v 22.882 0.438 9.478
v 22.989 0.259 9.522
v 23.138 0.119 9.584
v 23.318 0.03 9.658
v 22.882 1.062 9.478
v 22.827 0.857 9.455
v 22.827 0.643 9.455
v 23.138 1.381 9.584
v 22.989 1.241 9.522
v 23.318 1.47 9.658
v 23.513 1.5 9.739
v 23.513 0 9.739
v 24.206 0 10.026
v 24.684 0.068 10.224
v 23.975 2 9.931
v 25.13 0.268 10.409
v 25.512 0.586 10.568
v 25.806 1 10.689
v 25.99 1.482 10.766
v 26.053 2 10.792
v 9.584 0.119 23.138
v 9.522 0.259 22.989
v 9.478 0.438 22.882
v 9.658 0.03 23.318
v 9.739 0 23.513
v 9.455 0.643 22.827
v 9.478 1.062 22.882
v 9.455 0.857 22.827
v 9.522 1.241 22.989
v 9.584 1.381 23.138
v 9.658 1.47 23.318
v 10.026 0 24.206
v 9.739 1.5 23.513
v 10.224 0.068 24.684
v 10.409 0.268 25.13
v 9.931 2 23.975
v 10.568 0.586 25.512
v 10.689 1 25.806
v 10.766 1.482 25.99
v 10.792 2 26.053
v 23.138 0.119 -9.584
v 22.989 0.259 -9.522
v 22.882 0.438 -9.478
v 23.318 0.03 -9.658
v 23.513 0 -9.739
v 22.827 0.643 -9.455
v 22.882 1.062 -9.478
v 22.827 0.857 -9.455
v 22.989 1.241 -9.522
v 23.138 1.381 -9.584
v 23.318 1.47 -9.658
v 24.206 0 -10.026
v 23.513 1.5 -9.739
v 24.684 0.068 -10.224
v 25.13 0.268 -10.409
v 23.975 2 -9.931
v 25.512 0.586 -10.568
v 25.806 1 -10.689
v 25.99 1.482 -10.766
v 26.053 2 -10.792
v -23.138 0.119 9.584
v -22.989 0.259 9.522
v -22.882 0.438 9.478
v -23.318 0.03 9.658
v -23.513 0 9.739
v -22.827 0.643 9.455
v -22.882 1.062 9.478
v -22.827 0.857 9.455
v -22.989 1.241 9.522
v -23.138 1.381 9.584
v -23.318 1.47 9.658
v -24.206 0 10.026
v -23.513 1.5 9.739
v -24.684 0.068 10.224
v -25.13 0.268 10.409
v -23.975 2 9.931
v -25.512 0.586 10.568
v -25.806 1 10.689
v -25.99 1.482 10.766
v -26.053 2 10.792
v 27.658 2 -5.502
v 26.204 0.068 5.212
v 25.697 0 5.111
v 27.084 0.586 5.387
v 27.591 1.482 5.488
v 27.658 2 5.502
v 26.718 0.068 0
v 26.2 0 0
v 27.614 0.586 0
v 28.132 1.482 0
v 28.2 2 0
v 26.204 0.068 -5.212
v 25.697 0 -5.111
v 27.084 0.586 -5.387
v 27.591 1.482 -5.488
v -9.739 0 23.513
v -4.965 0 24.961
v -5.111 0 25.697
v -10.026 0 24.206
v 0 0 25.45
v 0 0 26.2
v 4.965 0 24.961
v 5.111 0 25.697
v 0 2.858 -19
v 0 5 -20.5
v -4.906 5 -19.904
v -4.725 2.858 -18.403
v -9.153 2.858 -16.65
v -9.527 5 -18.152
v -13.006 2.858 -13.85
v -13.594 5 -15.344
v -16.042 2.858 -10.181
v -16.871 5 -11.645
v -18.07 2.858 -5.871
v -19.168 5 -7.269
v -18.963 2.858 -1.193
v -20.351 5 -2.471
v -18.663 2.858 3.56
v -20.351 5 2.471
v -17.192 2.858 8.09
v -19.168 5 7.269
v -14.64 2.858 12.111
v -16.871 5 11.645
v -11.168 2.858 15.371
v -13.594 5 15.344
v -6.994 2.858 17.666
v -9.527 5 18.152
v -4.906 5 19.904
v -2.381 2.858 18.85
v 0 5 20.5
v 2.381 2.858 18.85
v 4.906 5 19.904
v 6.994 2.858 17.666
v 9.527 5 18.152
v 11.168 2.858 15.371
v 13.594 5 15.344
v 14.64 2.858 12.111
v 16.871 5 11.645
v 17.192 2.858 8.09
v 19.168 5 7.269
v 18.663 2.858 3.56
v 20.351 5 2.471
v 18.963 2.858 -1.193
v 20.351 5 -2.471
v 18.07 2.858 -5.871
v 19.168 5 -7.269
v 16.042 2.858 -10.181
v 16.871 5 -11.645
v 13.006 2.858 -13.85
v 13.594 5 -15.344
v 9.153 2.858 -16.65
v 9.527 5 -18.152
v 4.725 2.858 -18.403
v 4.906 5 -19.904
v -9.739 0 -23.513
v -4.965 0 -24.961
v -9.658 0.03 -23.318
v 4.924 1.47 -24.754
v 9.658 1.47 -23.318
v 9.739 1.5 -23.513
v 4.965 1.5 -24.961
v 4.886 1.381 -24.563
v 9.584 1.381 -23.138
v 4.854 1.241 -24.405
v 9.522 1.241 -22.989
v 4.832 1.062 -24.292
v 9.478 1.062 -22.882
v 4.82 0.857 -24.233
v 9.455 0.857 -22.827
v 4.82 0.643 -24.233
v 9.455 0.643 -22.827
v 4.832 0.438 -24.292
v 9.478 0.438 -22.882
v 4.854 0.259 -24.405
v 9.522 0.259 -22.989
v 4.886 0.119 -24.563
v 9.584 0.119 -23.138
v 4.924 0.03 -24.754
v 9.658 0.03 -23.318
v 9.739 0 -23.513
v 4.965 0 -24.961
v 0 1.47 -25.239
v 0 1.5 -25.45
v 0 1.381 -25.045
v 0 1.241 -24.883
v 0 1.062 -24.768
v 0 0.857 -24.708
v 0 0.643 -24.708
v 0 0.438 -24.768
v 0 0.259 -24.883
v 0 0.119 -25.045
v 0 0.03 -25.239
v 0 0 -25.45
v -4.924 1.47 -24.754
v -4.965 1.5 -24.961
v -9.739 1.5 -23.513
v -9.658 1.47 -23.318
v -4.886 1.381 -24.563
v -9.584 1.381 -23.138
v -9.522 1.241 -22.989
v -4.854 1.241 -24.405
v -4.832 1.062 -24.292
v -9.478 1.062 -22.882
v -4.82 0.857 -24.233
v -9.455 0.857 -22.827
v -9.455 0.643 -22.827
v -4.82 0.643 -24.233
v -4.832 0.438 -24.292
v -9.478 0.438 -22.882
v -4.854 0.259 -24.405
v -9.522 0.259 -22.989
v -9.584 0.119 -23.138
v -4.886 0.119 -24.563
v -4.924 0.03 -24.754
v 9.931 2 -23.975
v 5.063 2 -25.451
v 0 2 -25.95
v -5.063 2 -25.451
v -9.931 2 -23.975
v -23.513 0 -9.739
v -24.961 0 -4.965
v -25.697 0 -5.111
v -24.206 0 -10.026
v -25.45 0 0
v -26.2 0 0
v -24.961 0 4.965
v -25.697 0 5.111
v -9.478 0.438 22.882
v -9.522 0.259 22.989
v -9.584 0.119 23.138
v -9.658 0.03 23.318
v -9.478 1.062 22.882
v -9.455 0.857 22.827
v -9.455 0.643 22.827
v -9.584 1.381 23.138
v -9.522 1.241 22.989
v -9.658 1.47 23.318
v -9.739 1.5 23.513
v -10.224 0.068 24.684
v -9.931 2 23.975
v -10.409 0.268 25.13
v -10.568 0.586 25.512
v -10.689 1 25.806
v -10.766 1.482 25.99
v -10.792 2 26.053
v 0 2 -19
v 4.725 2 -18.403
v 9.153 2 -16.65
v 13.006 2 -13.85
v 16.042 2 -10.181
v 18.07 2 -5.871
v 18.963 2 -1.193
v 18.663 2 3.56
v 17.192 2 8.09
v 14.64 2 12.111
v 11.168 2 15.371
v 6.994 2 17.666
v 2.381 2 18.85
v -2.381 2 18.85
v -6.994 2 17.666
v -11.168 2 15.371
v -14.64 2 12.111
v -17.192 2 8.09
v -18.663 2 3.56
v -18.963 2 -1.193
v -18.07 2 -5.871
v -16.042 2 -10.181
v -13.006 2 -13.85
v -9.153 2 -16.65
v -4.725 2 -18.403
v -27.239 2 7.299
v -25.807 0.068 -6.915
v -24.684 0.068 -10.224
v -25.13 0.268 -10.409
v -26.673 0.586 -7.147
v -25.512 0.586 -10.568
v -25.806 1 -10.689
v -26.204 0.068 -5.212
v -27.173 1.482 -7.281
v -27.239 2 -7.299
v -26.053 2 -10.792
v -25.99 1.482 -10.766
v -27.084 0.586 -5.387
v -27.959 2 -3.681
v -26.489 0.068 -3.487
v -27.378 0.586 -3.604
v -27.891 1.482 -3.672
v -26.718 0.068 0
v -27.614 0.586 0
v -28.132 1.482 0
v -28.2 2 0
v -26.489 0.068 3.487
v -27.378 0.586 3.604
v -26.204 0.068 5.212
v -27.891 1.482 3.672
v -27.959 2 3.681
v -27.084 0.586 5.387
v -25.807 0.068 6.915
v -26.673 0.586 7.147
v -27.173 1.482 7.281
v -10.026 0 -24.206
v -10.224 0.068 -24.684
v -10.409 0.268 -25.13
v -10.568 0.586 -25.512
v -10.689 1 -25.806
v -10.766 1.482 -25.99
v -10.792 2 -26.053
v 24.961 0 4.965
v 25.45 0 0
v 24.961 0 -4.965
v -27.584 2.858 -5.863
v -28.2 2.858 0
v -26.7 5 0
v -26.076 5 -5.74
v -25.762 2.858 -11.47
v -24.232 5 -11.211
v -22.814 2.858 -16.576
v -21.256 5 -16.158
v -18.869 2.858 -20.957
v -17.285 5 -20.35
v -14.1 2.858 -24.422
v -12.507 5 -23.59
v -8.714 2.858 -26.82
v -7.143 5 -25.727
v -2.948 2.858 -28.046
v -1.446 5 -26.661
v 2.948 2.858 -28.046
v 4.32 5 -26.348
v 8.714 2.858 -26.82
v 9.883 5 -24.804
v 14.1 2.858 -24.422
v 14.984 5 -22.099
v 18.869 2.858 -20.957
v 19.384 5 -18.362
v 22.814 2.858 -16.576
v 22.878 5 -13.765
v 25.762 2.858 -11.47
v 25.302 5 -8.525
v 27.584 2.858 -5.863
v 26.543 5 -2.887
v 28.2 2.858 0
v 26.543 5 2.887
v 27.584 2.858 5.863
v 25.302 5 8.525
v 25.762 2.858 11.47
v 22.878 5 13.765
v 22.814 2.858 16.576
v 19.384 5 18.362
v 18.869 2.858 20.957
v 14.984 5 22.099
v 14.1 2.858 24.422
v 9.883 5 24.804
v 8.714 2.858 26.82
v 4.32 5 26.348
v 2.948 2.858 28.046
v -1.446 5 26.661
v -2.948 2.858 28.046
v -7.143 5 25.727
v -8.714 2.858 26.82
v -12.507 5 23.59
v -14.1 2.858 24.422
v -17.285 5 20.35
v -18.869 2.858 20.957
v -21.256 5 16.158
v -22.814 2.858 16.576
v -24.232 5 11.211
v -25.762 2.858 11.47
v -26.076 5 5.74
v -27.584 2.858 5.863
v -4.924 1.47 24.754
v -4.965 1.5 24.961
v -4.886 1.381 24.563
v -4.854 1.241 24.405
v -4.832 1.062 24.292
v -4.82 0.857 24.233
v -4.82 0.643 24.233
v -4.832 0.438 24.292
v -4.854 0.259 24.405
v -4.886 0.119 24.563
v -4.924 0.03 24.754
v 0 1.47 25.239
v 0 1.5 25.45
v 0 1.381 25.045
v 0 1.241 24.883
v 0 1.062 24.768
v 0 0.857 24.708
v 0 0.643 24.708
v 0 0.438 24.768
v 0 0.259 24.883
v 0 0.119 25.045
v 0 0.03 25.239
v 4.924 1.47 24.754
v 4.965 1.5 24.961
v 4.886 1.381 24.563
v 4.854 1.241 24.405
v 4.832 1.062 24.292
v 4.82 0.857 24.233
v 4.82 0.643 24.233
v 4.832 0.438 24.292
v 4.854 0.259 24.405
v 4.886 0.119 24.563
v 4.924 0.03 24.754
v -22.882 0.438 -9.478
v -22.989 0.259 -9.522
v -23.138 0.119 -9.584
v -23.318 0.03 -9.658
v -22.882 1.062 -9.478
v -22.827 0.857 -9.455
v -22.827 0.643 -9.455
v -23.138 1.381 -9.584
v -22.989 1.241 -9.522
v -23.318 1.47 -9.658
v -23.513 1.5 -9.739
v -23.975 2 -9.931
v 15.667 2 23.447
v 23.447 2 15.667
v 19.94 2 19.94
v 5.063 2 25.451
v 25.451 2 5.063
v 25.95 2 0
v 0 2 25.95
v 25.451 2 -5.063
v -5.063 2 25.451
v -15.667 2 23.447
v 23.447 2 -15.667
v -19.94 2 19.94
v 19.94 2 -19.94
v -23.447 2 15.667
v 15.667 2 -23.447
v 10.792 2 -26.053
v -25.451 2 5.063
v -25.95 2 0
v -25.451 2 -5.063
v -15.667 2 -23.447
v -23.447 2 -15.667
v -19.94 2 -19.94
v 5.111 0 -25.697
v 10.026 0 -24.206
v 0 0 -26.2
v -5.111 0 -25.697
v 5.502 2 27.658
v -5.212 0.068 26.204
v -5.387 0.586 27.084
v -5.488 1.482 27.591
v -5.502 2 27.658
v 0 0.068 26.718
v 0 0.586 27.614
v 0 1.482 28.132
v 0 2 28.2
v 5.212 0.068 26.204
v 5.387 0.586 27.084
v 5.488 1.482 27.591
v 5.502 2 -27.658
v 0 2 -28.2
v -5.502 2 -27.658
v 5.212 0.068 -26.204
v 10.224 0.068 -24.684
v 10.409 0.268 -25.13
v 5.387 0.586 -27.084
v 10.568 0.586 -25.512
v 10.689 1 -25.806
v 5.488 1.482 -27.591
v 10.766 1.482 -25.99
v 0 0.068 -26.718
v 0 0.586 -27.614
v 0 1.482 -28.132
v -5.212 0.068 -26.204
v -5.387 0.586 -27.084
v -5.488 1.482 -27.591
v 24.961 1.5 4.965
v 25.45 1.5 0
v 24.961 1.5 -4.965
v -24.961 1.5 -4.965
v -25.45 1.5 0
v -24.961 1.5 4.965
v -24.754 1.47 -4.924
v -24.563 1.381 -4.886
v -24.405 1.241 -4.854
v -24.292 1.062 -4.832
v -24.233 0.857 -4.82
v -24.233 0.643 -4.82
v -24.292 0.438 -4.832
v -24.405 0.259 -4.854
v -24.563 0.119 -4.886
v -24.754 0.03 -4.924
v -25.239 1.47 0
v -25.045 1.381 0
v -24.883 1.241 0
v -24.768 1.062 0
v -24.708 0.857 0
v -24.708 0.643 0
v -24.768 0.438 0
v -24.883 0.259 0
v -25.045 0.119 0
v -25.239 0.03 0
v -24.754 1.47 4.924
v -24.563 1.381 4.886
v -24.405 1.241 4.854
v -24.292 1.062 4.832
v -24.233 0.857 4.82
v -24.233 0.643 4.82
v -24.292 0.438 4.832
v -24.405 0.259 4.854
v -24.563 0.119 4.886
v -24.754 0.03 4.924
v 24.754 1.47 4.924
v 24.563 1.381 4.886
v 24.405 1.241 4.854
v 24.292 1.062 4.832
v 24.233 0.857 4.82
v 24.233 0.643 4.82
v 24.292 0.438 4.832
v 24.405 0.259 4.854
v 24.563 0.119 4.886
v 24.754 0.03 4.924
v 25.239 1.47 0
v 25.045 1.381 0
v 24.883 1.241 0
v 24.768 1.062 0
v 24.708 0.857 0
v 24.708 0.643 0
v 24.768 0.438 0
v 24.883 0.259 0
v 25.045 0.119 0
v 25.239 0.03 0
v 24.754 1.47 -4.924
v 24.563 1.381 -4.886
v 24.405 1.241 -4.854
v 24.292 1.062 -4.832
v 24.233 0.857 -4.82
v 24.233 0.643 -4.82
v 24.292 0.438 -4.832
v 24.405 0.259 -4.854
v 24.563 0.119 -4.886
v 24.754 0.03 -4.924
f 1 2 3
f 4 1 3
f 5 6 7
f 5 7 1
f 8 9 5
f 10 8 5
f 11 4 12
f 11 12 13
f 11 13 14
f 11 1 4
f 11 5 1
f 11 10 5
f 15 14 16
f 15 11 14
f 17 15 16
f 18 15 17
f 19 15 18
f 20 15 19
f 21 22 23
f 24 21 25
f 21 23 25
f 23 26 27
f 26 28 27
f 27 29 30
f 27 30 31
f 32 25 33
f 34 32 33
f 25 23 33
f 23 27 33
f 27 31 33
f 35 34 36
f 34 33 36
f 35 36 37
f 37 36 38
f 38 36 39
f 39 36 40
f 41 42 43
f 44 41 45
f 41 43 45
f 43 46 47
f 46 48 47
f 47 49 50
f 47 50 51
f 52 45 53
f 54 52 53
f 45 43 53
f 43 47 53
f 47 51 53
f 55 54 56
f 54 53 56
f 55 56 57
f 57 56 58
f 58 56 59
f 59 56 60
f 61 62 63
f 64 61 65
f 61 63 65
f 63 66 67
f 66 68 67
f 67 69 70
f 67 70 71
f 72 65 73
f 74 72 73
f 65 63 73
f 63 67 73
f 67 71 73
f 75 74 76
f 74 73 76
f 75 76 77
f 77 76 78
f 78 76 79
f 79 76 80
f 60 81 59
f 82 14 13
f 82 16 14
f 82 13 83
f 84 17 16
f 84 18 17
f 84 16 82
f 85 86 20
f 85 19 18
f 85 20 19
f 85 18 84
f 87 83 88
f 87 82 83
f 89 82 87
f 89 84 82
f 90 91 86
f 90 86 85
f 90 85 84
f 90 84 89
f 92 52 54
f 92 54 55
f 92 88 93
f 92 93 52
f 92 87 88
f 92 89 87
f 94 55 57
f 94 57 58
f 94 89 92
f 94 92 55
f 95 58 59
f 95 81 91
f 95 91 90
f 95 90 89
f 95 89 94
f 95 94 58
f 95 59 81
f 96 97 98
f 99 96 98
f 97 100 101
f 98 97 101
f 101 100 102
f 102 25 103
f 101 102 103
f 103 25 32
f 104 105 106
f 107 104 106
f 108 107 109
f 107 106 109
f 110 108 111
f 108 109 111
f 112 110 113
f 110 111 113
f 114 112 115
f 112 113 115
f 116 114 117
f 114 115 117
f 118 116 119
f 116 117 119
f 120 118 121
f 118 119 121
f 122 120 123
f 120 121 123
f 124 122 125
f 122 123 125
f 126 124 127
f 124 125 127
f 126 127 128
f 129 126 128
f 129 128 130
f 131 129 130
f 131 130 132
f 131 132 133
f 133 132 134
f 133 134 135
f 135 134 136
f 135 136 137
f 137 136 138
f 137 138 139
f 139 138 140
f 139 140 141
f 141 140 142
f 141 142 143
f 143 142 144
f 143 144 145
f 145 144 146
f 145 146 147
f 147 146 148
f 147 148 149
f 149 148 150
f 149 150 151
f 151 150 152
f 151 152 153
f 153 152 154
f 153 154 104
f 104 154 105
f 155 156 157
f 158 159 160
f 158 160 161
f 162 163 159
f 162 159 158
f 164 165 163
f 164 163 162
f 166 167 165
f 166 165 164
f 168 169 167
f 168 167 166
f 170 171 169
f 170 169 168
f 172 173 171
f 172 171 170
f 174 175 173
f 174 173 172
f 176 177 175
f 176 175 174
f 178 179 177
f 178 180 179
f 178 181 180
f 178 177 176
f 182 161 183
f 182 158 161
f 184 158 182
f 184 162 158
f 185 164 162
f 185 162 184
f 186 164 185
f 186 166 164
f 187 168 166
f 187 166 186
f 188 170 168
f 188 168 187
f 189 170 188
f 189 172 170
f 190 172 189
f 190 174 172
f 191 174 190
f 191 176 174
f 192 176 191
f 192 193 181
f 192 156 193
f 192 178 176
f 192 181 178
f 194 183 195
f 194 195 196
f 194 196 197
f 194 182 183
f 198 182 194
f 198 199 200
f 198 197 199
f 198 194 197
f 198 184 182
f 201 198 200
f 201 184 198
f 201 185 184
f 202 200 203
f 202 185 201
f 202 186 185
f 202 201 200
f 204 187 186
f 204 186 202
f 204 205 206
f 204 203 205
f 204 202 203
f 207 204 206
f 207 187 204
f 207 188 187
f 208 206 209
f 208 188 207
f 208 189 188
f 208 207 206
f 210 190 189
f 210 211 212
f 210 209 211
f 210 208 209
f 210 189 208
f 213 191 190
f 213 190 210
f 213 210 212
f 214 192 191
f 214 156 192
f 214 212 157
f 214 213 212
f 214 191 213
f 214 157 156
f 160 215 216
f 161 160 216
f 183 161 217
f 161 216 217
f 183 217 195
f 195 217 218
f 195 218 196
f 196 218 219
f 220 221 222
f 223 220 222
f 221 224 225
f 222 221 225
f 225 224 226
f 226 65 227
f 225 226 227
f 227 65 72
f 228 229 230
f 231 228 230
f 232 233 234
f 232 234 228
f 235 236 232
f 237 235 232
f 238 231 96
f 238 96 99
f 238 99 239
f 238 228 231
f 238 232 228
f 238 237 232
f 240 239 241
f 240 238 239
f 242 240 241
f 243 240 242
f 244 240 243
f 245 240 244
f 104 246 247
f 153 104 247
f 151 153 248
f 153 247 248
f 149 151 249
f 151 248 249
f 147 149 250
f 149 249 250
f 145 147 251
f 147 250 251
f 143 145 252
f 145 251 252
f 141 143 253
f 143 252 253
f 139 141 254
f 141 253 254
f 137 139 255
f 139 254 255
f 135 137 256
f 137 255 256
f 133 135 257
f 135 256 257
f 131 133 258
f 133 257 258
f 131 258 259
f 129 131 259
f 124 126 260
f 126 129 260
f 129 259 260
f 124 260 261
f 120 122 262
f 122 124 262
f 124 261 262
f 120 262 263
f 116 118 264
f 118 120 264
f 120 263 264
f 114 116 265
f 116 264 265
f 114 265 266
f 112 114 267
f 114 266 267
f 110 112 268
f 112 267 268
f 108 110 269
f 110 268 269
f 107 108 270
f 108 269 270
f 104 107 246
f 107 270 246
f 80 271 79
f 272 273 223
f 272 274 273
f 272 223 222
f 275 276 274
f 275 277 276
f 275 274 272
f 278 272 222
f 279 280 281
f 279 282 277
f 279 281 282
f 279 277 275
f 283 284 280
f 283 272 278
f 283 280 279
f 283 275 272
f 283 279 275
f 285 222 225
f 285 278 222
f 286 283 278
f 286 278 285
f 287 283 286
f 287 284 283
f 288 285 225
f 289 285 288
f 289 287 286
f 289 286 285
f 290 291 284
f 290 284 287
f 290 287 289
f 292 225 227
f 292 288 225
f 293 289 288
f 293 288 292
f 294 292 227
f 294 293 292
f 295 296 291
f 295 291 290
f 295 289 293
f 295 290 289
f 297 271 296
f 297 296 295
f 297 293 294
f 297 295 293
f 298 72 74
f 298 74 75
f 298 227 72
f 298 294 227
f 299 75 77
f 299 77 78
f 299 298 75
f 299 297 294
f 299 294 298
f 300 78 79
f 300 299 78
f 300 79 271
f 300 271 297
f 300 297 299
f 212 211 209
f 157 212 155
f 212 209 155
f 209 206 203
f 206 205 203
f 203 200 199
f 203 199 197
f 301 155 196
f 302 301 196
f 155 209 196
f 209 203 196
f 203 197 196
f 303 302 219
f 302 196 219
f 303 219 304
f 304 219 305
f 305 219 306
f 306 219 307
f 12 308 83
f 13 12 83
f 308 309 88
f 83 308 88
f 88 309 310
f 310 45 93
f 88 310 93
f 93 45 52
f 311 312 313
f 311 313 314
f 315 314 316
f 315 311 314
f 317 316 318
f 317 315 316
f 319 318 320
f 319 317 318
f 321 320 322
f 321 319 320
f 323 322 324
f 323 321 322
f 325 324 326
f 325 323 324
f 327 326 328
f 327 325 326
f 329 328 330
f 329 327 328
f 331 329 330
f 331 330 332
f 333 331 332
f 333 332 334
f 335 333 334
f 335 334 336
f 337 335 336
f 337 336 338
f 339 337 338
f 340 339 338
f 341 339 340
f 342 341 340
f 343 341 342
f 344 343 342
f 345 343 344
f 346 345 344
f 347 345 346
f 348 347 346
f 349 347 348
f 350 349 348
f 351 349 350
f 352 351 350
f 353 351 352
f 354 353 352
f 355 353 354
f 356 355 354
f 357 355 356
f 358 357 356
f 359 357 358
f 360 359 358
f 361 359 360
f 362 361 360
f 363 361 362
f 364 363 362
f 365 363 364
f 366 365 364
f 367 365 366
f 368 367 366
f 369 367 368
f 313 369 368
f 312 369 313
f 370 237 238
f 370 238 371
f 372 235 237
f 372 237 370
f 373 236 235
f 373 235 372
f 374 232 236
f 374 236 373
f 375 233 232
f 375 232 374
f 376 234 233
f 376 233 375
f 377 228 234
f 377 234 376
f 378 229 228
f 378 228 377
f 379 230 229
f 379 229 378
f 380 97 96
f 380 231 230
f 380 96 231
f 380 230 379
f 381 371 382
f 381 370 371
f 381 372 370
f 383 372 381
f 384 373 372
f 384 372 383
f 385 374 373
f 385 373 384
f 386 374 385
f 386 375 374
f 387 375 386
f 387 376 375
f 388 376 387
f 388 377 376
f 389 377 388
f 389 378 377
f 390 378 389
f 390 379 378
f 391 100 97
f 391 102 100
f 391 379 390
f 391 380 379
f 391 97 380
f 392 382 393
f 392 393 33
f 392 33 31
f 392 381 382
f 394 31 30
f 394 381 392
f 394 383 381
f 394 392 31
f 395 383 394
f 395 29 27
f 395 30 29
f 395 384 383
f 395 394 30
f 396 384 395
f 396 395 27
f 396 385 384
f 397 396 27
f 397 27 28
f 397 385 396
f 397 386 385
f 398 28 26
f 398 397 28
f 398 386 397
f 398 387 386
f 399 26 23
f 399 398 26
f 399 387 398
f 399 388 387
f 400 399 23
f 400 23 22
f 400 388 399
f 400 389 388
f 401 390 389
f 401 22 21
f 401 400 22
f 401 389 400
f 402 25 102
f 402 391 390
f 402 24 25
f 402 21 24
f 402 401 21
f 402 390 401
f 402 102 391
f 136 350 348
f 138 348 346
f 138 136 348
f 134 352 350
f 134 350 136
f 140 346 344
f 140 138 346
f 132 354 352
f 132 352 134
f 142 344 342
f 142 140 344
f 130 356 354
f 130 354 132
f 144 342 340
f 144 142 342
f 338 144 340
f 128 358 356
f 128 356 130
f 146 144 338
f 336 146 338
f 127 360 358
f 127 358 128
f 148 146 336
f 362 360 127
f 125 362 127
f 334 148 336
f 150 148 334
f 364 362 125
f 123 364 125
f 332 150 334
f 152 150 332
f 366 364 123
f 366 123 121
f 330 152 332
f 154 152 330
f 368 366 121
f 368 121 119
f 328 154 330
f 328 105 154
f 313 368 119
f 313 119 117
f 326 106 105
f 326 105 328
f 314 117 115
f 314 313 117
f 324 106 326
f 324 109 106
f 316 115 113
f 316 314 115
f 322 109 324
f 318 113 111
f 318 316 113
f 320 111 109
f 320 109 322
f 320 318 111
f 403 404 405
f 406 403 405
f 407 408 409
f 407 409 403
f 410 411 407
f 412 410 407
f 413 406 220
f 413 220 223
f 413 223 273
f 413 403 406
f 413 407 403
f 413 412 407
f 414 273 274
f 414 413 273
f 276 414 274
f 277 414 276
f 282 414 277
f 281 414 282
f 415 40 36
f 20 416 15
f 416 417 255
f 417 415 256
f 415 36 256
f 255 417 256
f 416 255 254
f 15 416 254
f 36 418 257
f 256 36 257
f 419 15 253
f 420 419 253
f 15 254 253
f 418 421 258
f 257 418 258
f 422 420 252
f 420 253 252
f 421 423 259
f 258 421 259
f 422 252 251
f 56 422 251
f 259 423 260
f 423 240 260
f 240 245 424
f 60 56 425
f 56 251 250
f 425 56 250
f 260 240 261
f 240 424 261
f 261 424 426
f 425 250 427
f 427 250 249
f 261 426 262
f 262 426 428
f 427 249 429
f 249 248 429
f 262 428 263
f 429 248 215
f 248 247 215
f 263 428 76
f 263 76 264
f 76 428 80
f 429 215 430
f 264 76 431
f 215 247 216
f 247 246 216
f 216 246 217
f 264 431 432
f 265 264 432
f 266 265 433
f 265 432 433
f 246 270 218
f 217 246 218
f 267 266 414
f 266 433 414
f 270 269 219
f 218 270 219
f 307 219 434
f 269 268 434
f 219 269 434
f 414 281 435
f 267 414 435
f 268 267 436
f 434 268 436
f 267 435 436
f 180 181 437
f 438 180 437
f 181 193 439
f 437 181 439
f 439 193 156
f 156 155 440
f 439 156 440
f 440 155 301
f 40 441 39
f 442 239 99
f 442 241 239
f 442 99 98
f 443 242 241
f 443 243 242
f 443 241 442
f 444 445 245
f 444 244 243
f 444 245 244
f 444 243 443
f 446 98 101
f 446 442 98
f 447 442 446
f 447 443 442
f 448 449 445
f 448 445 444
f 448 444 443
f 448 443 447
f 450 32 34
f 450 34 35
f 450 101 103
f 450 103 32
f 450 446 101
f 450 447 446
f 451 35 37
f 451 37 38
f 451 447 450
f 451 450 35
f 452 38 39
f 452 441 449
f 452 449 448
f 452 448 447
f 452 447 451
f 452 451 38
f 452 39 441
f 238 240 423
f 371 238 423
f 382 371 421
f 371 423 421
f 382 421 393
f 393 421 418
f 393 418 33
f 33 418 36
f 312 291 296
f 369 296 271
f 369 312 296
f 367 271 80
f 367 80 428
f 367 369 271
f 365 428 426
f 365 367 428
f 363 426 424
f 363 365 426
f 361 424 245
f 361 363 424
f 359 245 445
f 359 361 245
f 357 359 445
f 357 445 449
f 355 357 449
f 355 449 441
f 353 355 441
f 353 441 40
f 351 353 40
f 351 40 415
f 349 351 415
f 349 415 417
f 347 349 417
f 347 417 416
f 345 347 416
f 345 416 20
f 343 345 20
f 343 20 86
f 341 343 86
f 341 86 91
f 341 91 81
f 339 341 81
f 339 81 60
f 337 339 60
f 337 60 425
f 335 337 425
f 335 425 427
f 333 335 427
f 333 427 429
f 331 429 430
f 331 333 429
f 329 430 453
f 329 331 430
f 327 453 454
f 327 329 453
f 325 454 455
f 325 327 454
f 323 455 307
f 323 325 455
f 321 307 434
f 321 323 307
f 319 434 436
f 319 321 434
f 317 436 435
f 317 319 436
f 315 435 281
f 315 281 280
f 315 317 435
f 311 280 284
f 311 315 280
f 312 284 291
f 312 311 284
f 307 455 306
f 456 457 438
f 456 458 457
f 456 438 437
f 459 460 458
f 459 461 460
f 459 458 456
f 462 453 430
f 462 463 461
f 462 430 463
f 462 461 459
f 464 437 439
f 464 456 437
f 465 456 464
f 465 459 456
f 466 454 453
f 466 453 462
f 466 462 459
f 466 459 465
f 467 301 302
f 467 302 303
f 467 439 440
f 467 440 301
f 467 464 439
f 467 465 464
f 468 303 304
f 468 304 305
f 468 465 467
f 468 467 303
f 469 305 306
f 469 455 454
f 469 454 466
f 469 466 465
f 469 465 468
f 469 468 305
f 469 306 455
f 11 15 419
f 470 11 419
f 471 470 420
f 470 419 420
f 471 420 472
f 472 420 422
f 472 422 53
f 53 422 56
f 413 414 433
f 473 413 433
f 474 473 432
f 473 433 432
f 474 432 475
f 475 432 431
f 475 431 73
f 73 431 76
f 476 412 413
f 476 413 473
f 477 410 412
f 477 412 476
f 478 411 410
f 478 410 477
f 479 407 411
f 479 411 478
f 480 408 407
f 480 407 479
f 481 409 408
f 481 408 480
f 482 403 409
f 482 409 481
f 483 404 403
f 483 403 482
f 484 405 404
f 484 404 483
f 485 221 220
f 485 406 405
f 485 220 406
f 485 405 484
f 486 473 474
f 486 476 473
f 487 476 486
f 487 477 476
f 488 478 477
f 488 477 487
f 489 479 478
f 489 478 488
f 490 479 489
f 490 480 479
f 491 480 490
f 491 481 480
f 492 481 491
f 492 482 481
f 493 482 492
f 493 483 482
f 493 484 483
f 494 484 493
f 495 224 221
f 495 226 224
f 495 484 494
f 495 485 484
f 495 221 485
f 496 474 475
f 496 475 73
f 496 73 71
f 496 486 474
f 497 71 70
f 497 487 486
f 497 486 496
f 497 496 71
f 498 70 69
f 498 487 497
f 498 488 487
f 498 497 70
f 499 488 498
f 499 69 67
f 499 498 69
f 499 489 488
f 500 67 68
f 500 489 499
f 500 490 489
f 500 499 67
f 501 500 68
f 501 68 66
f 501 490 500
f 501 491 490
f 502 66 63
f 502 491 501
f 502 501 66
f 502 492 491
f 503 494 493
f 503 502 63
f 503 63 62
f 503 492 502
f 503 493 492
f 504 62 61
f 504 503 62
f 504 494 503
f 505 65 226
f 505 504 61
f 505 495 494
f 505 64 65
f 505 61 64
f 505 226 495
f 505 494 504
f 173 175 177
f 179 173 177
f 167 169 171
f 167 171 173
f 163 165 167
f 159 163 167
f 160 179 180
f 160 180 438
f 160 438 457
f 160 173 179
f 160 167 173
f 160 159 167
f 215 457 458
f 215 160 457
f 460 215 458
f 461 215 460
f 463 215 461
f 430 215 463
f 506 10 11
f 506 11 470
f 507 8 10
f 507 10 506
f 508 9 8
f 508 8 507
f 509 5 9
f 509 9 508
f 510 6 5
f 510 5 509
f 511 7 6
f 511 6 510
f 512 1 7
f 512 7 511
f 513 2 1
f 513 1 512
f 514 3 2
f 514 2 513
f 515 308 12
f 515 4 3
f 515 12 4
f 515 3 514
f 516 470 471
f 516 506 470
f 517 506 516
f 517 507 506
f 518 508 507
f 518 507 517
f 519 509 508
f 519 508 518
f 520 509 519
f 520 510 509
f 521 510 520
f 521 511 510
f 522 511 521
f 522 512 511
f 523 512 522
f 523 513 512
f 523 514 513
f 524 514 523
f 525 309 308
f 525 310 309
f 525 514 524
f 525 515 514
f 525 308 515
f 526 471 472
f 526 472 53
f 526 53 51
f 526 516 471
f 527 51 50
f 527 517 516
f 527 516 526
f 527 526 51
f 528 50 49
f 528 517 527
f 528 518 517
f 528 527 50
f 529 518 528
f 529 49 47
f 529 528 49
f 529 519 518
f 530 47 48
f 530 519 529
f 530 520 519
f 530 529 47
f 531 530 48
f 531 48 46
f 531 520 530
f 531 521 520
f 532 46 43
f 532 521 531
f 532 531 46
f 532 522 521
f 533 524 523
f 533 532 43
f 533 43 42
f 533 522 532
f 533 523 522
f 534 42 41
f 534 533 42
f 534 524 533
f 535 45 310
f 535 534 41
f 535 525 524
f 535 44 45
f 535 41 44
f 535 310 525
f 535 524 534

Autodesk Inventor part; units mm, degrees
ref_plane "YZ Plane" through (0, 0, 0) normal (1, 0, 0) x (0, 1, 0)
ref_plane "XZ Plane" through (0, 0, 0) normal (0, 1, 0) x (-1, 0, 0)
ref_plane "XY Plane" through (0, 0, 0) normal (0, 0, 1) x (1, 0, 0)
sketch "Эскиз1" plane through (0, 0, 0) normal (1, 0, 0) x (0, 1, 0)
  line L0 (0, 0) -> (13.9611, 0) construction
  line L1 (0, 26.35) -> (-10, 26.35) construction
  line L2 (-10, 26.35) -> (-10, -26.35) construction
  line L3 (-10, -26.35) -> (0, -26.35) construction
  line L4 (0, -26.35) -> (0, 26.35) construction
  line L5 (0, 0) -> (0, -22.0675) construction
  line L6 (2, 25) -> (0, 25) construction
  line L7 (0, 25) -> (0, -25) construction
  line L8 (0, -25) -> (2, -25) construction
  line L9 (2, -25) -> (2, 25) construction
  line L10 (5, -19) -> (5, -30.35)
  line L11 (-2, -11.433) -> (-2, -38.2242) construction
  line L12 (5, -19) -> (2, -19)
  line L13 (5, -30.35) -> (2, -30.35)
  line L14 (2, -30.35) -> (2, -19)
  dimension "d0" = 10
  dimension "d1" = 52.7
  dimension "d2" = 2
  dimension "d3" = 50
  dimension "d4" = 3
  dimension "d6" = 2
  dimension "d7" = 6
  dimension "d8" = 3
  dimension "d10" = 4
revolve "Вращение1" add sketch "Эскиз1" angle 360 about axis through (0, 0, 0) along (0, 1, 0)
chamfer "Фаска1" distance 1.5 angle 55 1 edges at (0, 5, 19) measured on face at (2.4211, 5, -26.2727)
sketch "Эскиз2" plane through (0, 0, 0) normal (0, 0, 1) x (1, 0, 0)
  line L0 (-30.35, 5) -> (30.35, 5) construction
  line L1 (-30.35, 2) -> (30.35, 2) construction
  line L2 (-19, 2.8578) -> (19, 2.8578) construction
  line L3 (20.5, 5) -> (-20.5, 5) construction
  line L4 (-19, 2) -> (19, 2) construction
  line L5 (-19, 2.8578) -> (19, 2.8578) construction
  line L6 (0, 0) -> (25, 0) construction
  line L7 (25, 2) -> (25, -8.0068) construction
  line L8 (-30.35, 2) -> (30.35, 2) construction
  line L9 (25.2, 2) -> (25.2, -4.9803) construction
  line L10 (25.45, 1.5) -> (25.45, 1.5) construction
  line L11 (26.2, 1.5) -> (26.2, 0) construction
  line L12 (26.2, 0) -> (25.45, 0) construction
  line L13 (24.7, 0.75) -> (24.7, 0.75) construction
  line L14 (26.2, 0) -> (26.2, 0) construction
  line L15 (28.2, 2) -> (28.2, 2) construction
  line L16 (28.2, 2) -> (26.2, 2) construction
  line L17 (26.2, 2) -> (26.2, 2.25) construction
  arc A0 (25.45, 1.5) -> (24.7, 0.75) centre (25.45, 0.75) ccw
  arc A1 (24.7, 0.75) -> (25.45, 0) centre (25.45, 0.75) ccw
  arc A2 (26.2, 0) -> (28.2, 2) centre (26.2, 2) ccw
  line L18 (25.95, 2) -> (28.2, 2)
  line L19 (25.45, 0) -> (26.2, 0)
  line L20 (-19, 2) -> (19, 2) projected
  line L21 (0, 2) -> (0, 5)
  line L22 (-30.35, 5) -> (30.35, 5) projected
  line L23 (25.45, 1.5) -> (25.95, 2)
  point P0 (24.7, 0)
  point P1 (24.7, 0.75)
  point P2 (25.45, 1.5)
  dimension "d15" = 25
  dimension "d16" = 0.2
  dimension "d17" = 1.5
  dimension "d18" = 1.5
  dimension "d19" = 0.5
  dimension "d20" = 2
  dimension "d21" = 0.75
  dimension "d22" = 2
  dimension "d31" = 45
revolve "Вращение2" add sketch "Эскиз2" angle 45 mid plane about axis through (0, 2, 0) along (0, 1, 0)
pattern_circular "Круговой массив1" count 4 over 360 about axis through (0, 3.5, 0) along (0, -1, 0) of "Вращение2"
sketch "Эскиз3" plane through (0, 0, 0) normal (0, 0, 1) x (1, 0, 0)
  line L0 (-30.35, 5) -> (30.35, 5) construction
  line L1 (20.5, 5) -> (-20.5, 5) construction
  arc A0 (-28.2, 2) -> (-26.2, 0) centre (-26.2, 2) ccw construction
  line L2 (-28.2, 2) -> (-28.2, 5)
  line L3 (-28.2, 5) -> (-20.5, 5) construction
  line L4 (-28.2, 2) -> (-31.4016, 2)
  line L5 (-31.4016, 2) -> (-31.4016, 5.1774)
  line L6 (-31.4016, 5.1774) -> (-28.2, 5.1774)
  line L7 (-28.2, 5.1774) -> (-28.2, 2)
  line L8 (0, 0) -> (0, 5)
revolve "Вращение3" cut sketch "Эскиз3" angle 360 about axis through (0, 0, 0) along (0, 1, 0)
chamfer "Фаска2" distance 1.5 angle 55 1 edges at (28.2, 5, 0) measured on face at (-25.3104, 5, -3.0732)
properties part number "mirror_lock_v1"
